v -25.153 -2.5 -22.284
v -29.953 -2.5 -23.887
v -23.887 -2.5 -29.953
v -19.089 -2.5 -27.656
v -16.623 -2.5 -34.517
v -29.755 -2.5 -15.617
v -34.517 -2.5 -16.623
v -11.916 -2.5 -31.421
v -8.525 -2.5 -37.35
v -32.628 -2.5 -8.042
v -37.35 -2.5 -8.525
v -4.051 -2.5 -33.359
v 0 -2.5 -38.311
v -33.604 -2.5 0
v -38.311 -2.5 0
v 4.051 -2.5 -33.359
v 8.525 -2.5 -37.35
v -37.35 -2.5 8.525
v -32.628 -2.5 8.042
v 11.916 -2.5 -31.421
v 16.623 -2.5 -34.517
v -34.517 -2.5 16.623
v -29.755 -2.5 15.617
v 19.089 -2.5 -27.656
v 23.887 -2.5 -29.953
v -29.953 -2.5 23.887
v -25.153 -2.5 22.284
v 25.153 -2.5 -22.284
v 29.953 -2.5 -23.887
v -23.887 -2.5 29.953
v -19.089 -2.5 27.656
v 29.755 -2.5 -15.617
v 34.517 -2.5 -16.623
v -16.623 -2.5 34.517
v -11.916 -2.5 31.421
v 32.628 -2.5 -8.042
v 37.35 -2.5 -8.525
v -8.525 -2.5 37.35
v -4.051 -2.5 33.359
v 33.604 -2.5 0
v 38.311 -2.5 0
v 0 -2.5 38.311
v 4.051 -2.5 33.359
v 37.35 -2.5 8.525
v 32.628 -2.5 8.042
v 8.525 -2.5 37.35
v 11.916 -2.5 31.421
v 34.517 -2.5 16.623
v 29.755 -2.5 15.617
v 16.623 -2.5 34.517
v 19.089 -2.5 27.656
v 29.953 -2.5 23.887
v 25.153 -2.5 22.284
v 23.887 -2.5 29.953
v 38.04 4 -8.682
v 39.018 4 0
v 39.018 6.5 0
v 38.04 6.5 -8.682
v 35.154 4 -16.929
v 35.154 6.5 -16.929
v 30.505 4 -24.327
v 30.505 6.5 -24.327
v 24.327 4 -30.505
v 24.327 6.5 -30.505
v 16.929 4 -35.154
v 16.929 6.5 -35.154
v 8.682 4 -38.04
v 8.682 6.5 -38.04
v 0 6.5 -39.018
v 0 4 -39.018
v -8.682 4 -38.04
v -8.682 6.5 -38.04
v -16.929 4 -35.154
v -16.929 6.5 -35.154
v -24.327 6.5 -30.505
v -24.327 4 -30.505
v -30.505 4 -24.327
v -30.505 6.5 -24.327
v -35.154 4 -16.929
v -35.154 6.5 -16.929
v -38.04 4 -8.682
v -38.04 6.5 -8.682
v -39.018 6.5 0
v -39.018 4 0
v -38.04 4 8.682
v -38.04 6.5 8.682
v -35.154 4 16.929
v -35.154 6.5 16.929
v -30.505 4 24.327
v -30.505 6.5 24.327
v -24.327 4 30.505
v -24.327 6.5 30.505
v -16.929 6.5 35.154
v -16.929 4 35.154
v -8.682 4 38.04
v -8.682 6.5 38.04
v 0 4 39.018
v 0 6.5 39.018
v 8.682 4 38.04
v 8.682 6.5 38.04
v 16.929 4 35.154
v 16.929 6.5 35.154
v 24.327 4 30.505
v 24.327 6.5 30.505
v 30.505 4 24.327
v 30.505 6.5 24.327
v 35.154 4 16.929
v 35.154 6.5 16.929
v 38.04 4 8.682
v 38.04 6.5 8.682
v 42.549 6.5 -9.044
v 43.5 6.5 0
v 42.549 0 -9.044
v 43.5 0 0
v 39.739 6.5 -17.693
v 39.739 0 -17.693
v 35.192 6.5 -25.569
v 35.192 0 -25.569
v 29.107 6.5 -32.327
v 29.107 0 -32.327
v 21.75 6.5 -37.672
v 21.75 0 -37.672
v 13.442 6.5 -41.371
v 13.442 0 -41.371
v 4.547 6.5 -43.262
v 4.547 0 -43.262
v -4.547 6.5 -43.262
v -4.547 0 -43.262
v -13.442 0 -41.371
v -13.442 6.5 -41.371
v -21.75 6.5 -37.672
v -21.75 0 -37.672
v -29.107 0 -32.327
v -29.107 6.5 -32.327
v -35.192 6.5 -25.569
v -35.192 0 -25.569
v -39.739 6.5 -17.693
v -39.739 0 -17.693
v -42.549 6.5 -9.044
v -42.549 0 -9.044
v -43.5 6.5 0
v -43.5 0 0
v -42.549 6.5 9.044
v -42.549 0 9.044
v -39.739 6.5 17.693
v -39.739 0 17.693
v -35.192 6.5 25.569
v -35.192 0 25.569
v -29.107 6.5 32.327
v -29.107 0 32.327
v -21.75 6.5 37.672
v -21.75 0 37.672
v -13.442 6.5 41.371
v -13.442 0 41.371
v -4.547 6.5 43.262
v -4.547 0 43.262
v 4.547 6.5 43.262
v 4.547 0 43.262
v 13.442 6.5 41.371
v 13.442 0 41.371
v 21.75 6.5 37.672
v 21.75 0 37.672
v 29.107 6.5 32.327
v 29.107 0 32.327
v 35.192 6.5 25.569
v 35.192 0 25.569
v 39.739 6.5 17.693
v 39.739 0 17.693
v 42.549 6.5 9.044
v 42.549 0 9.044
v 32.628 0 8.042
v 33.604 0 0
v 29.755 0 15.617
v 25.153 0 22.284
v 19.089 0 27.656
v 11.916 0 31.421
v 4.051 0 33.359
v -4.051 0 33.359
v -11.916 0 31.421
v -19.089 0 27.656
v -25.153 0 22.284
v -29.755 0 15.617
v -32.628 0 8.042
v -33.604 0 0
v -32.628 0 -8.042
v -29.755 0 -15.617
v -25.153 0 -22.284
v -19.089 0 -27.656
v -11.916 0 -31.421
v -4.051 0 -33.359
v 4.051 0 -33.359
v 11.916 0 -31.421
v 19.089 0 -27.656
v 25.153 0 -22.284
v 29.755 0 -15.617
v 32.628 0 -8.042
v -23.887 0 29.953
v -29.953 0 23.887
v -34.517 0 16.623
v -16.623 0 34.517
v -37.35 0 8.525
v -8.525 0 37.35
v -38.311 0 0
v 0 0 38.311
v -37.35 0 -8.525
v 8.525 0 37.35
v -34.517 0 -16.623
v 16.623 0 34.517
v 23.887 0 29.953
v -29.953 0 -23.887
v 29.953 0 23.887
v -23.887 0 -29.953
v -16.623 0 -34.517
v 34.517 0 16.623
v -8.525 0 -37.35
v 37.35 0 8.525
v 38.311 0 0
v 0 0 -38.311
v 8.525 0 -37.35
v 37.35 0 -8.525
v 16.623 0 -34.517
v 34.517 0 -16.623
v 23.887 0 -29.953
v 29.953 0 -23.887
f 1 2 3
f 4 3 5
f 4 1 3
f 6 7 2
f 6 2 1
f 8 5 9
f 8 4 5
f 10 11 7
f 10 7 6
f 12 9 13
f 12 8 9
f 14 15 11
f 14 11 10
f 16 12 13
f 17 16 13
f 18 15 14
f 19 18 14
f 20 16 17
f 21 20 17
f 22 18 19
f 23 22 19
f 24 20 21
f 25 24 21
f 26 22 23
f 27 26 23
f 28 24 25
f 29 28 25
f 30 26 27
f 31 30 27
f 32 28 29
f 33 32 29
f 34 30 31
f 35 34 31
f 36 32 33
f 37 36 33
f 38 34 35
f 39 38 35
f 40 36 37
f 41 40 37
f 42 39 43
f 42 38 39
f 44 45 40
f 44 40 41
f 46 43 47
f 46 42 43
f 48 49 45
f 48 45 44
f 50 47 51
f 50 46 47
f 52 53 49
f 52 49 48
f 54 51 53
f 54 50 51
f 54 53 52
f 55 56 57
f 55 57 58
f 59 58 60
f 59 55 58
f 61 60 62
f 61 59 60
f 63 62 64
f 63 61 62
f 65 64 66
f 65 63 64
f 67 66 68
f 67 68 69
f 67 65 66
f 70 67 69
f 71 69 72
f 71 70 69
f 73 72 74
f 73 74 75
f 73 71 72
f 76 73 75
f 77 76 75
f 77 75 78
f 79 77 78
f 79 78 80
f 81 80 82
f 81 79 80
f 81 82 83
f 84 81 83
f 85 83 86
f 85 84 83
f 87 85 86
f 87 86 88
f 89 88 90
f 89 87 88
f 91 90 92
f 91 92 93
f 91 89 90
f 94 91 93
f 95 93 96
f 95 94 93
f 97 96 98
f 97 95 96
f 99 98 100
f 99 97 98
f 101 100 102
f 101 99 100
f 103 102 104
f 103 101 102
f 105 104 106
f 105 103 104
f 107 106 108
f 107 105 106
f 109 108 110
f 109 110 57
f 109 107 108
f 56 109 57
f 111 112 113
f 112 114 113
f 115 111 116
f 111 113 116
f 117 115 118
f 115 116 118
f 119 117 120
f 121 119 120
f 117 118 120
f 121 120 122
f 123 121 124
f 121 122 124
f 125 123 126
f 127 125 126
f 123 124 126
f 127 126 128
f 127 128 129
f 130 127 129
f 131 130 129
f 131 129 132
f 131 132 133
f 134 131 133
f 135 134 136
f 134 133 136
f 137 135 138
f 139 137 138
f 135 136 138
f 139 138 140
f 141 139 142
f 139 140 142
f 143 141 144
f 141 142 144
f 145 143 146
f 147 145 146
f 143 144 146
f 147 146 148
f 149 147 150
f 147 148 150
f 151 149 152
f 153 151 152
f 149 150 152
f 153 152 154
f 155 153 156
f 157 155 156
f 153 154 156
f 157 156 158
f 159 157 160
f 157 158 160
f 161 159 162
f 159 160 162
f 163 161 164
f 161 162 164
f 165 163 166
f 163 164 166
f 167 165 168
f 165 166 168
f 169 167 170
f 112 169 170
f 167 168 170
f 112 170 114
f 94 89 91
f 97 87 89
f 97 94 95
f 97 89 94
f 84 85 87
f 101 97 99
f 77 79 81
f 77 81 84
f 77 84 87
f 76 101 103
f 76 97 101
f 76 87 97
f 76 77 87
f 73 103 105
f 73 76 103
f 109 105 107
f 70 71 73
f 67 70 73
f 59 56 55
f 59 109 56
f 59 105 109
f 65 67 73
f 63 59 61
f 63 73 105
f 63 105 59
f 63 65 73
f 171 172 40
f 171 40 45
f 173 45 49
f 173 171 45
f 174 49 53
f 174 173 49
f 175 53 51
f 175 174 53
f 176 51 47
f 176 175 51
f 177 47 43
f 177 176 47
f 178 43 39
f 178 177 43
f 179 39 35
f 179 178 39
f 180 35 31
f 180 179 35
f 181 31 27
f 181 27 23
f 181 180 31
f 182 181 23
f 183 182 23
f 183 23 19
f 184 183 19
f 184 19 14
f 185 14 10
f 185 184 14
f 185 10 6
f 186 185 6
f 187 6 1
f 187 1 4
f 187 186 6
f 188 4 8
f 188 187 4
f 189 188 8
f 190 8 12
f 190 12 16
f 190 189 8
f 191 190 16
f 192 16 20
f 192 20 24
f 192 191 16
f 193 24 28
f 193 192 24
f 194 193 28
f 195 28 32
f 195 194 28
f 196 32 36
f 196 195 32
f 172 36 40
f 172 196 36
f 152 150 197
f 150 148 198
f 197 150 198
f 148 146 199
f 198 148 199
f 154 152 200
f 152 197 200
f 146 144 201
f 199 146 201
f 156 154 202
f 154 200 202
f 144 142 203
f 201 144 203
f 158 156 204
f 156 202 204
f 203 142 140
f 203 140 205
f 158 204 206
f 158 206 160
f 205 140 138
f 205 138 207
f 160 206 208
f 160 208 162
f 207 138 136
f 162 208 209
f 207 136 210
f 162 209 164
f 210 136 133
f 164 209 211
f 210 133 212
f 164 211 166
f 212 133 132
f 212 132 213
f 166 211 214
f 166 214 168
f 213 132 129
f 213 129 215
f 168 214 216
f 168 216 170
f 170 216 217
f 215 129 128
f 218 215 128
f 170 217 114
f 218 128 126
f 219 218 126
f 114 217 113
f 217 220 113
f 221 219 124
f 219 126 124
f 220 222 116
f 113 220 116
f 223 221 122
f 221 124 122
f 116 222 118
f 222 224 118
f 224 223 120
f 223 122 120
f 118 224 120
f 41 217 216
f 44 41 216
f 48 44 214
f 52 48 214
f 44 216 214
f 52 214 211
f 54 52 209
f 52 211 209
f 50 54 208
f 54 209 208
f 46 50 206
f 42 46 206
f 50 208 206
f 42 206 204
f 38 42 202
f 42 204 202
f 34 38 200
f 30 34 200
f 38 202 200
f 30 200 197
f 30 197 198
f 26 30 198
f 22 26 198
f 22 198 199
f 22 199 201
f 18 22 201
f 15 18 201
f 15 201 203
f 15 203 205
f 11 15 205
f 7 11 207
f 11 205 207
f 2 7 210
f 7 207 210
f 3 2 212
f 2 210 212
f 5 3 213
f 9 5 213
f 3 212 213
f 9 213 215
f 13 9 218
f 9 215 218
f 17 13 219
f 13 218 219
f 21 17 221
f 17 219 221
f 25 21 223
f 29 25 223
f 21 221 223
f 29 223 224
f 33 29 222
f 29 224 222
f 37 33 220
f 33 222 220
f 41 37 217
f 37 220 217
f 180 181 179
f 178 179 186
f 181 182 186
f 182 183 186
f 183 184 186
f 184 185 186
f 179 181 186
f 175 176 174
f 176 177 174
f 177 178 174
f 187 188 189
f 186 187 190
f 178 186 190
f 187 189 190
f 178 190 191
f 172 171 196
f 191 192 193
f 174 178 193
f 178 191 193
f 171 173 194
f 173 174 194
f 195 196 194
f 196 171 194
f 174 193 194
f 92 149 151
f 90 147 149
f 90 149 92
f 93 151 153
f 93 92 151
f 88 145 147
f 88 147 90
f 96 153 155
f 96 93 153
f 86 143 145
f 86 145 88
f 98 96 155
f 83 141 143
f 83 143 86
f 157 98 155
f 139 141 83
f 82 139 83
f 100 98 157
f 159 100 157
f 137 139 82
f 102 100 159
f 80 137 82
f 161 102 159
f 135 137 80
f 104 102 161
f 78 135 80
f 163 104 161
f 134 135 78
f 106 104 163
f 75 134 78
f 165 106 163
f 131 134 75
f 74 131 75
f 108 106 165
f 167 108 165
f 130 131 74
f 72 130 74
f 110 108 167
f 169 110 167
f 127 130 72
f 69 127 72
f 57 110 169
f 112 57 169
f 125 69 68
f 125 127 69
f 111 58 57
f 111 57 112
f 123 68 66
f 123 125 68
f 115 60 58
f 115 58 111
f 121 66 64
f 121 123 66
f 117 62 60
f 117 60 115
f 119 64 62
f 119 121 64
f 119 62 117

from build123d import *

# Parameters (mm, degrees)
CROQUIS1_R              = 43.5
SALIENTE_EXTRUIR1_DEPTH = 4
CROQUIS2_R              = 43.5
CROQUIS2_R_2            = 39.017907213
SALIENTE_EXTRUIR2_DEPTH = 2.5
CROQUIS3_R              = 38.31099811
CROQUIS3_R_2            = 33.604332007
SALIENTE_EXTRUIR3_DEPTH = 2.5


with BuildPart() as part:
    # Croquis1 → Saliente-Extruir1 (new body)
    with BuildSketch(Plane(origin=(0, 0, 0), x_dir=(1, 0, 0), z_dir=(0, 1, 0))):
        Circle(CROQUIS1_R)
    extrude(amount=SALIENTE_EXTRUIR1_DEPTH)

    # Croquis2 → Saliente-Extruir2 (add)
    with BuildSketch(Plane(origin=(0, 4, 0), x_dir=(1, 0, 0), z_dir=(0, 1, 0))):
        Circle(CROQUIS2_R)
        Circle(CROQUIS2_R_2, mode=Mode.SUBTRACT)
    extrude(amount=SALIENTE_EXTRUIR2_DEPTH)

    # Croquis3 → Saliente-Extruir3 (add)
    with BuildSketch(Plane.XZ):
        Circle(CROQUIS3_R)
        Circle(CROQUIS3_R_2, mode=Mode.SUBTRACT)
    extrude(amount=SALIENTE_EXTRUIR3_DEPTH)


solid = part.part
